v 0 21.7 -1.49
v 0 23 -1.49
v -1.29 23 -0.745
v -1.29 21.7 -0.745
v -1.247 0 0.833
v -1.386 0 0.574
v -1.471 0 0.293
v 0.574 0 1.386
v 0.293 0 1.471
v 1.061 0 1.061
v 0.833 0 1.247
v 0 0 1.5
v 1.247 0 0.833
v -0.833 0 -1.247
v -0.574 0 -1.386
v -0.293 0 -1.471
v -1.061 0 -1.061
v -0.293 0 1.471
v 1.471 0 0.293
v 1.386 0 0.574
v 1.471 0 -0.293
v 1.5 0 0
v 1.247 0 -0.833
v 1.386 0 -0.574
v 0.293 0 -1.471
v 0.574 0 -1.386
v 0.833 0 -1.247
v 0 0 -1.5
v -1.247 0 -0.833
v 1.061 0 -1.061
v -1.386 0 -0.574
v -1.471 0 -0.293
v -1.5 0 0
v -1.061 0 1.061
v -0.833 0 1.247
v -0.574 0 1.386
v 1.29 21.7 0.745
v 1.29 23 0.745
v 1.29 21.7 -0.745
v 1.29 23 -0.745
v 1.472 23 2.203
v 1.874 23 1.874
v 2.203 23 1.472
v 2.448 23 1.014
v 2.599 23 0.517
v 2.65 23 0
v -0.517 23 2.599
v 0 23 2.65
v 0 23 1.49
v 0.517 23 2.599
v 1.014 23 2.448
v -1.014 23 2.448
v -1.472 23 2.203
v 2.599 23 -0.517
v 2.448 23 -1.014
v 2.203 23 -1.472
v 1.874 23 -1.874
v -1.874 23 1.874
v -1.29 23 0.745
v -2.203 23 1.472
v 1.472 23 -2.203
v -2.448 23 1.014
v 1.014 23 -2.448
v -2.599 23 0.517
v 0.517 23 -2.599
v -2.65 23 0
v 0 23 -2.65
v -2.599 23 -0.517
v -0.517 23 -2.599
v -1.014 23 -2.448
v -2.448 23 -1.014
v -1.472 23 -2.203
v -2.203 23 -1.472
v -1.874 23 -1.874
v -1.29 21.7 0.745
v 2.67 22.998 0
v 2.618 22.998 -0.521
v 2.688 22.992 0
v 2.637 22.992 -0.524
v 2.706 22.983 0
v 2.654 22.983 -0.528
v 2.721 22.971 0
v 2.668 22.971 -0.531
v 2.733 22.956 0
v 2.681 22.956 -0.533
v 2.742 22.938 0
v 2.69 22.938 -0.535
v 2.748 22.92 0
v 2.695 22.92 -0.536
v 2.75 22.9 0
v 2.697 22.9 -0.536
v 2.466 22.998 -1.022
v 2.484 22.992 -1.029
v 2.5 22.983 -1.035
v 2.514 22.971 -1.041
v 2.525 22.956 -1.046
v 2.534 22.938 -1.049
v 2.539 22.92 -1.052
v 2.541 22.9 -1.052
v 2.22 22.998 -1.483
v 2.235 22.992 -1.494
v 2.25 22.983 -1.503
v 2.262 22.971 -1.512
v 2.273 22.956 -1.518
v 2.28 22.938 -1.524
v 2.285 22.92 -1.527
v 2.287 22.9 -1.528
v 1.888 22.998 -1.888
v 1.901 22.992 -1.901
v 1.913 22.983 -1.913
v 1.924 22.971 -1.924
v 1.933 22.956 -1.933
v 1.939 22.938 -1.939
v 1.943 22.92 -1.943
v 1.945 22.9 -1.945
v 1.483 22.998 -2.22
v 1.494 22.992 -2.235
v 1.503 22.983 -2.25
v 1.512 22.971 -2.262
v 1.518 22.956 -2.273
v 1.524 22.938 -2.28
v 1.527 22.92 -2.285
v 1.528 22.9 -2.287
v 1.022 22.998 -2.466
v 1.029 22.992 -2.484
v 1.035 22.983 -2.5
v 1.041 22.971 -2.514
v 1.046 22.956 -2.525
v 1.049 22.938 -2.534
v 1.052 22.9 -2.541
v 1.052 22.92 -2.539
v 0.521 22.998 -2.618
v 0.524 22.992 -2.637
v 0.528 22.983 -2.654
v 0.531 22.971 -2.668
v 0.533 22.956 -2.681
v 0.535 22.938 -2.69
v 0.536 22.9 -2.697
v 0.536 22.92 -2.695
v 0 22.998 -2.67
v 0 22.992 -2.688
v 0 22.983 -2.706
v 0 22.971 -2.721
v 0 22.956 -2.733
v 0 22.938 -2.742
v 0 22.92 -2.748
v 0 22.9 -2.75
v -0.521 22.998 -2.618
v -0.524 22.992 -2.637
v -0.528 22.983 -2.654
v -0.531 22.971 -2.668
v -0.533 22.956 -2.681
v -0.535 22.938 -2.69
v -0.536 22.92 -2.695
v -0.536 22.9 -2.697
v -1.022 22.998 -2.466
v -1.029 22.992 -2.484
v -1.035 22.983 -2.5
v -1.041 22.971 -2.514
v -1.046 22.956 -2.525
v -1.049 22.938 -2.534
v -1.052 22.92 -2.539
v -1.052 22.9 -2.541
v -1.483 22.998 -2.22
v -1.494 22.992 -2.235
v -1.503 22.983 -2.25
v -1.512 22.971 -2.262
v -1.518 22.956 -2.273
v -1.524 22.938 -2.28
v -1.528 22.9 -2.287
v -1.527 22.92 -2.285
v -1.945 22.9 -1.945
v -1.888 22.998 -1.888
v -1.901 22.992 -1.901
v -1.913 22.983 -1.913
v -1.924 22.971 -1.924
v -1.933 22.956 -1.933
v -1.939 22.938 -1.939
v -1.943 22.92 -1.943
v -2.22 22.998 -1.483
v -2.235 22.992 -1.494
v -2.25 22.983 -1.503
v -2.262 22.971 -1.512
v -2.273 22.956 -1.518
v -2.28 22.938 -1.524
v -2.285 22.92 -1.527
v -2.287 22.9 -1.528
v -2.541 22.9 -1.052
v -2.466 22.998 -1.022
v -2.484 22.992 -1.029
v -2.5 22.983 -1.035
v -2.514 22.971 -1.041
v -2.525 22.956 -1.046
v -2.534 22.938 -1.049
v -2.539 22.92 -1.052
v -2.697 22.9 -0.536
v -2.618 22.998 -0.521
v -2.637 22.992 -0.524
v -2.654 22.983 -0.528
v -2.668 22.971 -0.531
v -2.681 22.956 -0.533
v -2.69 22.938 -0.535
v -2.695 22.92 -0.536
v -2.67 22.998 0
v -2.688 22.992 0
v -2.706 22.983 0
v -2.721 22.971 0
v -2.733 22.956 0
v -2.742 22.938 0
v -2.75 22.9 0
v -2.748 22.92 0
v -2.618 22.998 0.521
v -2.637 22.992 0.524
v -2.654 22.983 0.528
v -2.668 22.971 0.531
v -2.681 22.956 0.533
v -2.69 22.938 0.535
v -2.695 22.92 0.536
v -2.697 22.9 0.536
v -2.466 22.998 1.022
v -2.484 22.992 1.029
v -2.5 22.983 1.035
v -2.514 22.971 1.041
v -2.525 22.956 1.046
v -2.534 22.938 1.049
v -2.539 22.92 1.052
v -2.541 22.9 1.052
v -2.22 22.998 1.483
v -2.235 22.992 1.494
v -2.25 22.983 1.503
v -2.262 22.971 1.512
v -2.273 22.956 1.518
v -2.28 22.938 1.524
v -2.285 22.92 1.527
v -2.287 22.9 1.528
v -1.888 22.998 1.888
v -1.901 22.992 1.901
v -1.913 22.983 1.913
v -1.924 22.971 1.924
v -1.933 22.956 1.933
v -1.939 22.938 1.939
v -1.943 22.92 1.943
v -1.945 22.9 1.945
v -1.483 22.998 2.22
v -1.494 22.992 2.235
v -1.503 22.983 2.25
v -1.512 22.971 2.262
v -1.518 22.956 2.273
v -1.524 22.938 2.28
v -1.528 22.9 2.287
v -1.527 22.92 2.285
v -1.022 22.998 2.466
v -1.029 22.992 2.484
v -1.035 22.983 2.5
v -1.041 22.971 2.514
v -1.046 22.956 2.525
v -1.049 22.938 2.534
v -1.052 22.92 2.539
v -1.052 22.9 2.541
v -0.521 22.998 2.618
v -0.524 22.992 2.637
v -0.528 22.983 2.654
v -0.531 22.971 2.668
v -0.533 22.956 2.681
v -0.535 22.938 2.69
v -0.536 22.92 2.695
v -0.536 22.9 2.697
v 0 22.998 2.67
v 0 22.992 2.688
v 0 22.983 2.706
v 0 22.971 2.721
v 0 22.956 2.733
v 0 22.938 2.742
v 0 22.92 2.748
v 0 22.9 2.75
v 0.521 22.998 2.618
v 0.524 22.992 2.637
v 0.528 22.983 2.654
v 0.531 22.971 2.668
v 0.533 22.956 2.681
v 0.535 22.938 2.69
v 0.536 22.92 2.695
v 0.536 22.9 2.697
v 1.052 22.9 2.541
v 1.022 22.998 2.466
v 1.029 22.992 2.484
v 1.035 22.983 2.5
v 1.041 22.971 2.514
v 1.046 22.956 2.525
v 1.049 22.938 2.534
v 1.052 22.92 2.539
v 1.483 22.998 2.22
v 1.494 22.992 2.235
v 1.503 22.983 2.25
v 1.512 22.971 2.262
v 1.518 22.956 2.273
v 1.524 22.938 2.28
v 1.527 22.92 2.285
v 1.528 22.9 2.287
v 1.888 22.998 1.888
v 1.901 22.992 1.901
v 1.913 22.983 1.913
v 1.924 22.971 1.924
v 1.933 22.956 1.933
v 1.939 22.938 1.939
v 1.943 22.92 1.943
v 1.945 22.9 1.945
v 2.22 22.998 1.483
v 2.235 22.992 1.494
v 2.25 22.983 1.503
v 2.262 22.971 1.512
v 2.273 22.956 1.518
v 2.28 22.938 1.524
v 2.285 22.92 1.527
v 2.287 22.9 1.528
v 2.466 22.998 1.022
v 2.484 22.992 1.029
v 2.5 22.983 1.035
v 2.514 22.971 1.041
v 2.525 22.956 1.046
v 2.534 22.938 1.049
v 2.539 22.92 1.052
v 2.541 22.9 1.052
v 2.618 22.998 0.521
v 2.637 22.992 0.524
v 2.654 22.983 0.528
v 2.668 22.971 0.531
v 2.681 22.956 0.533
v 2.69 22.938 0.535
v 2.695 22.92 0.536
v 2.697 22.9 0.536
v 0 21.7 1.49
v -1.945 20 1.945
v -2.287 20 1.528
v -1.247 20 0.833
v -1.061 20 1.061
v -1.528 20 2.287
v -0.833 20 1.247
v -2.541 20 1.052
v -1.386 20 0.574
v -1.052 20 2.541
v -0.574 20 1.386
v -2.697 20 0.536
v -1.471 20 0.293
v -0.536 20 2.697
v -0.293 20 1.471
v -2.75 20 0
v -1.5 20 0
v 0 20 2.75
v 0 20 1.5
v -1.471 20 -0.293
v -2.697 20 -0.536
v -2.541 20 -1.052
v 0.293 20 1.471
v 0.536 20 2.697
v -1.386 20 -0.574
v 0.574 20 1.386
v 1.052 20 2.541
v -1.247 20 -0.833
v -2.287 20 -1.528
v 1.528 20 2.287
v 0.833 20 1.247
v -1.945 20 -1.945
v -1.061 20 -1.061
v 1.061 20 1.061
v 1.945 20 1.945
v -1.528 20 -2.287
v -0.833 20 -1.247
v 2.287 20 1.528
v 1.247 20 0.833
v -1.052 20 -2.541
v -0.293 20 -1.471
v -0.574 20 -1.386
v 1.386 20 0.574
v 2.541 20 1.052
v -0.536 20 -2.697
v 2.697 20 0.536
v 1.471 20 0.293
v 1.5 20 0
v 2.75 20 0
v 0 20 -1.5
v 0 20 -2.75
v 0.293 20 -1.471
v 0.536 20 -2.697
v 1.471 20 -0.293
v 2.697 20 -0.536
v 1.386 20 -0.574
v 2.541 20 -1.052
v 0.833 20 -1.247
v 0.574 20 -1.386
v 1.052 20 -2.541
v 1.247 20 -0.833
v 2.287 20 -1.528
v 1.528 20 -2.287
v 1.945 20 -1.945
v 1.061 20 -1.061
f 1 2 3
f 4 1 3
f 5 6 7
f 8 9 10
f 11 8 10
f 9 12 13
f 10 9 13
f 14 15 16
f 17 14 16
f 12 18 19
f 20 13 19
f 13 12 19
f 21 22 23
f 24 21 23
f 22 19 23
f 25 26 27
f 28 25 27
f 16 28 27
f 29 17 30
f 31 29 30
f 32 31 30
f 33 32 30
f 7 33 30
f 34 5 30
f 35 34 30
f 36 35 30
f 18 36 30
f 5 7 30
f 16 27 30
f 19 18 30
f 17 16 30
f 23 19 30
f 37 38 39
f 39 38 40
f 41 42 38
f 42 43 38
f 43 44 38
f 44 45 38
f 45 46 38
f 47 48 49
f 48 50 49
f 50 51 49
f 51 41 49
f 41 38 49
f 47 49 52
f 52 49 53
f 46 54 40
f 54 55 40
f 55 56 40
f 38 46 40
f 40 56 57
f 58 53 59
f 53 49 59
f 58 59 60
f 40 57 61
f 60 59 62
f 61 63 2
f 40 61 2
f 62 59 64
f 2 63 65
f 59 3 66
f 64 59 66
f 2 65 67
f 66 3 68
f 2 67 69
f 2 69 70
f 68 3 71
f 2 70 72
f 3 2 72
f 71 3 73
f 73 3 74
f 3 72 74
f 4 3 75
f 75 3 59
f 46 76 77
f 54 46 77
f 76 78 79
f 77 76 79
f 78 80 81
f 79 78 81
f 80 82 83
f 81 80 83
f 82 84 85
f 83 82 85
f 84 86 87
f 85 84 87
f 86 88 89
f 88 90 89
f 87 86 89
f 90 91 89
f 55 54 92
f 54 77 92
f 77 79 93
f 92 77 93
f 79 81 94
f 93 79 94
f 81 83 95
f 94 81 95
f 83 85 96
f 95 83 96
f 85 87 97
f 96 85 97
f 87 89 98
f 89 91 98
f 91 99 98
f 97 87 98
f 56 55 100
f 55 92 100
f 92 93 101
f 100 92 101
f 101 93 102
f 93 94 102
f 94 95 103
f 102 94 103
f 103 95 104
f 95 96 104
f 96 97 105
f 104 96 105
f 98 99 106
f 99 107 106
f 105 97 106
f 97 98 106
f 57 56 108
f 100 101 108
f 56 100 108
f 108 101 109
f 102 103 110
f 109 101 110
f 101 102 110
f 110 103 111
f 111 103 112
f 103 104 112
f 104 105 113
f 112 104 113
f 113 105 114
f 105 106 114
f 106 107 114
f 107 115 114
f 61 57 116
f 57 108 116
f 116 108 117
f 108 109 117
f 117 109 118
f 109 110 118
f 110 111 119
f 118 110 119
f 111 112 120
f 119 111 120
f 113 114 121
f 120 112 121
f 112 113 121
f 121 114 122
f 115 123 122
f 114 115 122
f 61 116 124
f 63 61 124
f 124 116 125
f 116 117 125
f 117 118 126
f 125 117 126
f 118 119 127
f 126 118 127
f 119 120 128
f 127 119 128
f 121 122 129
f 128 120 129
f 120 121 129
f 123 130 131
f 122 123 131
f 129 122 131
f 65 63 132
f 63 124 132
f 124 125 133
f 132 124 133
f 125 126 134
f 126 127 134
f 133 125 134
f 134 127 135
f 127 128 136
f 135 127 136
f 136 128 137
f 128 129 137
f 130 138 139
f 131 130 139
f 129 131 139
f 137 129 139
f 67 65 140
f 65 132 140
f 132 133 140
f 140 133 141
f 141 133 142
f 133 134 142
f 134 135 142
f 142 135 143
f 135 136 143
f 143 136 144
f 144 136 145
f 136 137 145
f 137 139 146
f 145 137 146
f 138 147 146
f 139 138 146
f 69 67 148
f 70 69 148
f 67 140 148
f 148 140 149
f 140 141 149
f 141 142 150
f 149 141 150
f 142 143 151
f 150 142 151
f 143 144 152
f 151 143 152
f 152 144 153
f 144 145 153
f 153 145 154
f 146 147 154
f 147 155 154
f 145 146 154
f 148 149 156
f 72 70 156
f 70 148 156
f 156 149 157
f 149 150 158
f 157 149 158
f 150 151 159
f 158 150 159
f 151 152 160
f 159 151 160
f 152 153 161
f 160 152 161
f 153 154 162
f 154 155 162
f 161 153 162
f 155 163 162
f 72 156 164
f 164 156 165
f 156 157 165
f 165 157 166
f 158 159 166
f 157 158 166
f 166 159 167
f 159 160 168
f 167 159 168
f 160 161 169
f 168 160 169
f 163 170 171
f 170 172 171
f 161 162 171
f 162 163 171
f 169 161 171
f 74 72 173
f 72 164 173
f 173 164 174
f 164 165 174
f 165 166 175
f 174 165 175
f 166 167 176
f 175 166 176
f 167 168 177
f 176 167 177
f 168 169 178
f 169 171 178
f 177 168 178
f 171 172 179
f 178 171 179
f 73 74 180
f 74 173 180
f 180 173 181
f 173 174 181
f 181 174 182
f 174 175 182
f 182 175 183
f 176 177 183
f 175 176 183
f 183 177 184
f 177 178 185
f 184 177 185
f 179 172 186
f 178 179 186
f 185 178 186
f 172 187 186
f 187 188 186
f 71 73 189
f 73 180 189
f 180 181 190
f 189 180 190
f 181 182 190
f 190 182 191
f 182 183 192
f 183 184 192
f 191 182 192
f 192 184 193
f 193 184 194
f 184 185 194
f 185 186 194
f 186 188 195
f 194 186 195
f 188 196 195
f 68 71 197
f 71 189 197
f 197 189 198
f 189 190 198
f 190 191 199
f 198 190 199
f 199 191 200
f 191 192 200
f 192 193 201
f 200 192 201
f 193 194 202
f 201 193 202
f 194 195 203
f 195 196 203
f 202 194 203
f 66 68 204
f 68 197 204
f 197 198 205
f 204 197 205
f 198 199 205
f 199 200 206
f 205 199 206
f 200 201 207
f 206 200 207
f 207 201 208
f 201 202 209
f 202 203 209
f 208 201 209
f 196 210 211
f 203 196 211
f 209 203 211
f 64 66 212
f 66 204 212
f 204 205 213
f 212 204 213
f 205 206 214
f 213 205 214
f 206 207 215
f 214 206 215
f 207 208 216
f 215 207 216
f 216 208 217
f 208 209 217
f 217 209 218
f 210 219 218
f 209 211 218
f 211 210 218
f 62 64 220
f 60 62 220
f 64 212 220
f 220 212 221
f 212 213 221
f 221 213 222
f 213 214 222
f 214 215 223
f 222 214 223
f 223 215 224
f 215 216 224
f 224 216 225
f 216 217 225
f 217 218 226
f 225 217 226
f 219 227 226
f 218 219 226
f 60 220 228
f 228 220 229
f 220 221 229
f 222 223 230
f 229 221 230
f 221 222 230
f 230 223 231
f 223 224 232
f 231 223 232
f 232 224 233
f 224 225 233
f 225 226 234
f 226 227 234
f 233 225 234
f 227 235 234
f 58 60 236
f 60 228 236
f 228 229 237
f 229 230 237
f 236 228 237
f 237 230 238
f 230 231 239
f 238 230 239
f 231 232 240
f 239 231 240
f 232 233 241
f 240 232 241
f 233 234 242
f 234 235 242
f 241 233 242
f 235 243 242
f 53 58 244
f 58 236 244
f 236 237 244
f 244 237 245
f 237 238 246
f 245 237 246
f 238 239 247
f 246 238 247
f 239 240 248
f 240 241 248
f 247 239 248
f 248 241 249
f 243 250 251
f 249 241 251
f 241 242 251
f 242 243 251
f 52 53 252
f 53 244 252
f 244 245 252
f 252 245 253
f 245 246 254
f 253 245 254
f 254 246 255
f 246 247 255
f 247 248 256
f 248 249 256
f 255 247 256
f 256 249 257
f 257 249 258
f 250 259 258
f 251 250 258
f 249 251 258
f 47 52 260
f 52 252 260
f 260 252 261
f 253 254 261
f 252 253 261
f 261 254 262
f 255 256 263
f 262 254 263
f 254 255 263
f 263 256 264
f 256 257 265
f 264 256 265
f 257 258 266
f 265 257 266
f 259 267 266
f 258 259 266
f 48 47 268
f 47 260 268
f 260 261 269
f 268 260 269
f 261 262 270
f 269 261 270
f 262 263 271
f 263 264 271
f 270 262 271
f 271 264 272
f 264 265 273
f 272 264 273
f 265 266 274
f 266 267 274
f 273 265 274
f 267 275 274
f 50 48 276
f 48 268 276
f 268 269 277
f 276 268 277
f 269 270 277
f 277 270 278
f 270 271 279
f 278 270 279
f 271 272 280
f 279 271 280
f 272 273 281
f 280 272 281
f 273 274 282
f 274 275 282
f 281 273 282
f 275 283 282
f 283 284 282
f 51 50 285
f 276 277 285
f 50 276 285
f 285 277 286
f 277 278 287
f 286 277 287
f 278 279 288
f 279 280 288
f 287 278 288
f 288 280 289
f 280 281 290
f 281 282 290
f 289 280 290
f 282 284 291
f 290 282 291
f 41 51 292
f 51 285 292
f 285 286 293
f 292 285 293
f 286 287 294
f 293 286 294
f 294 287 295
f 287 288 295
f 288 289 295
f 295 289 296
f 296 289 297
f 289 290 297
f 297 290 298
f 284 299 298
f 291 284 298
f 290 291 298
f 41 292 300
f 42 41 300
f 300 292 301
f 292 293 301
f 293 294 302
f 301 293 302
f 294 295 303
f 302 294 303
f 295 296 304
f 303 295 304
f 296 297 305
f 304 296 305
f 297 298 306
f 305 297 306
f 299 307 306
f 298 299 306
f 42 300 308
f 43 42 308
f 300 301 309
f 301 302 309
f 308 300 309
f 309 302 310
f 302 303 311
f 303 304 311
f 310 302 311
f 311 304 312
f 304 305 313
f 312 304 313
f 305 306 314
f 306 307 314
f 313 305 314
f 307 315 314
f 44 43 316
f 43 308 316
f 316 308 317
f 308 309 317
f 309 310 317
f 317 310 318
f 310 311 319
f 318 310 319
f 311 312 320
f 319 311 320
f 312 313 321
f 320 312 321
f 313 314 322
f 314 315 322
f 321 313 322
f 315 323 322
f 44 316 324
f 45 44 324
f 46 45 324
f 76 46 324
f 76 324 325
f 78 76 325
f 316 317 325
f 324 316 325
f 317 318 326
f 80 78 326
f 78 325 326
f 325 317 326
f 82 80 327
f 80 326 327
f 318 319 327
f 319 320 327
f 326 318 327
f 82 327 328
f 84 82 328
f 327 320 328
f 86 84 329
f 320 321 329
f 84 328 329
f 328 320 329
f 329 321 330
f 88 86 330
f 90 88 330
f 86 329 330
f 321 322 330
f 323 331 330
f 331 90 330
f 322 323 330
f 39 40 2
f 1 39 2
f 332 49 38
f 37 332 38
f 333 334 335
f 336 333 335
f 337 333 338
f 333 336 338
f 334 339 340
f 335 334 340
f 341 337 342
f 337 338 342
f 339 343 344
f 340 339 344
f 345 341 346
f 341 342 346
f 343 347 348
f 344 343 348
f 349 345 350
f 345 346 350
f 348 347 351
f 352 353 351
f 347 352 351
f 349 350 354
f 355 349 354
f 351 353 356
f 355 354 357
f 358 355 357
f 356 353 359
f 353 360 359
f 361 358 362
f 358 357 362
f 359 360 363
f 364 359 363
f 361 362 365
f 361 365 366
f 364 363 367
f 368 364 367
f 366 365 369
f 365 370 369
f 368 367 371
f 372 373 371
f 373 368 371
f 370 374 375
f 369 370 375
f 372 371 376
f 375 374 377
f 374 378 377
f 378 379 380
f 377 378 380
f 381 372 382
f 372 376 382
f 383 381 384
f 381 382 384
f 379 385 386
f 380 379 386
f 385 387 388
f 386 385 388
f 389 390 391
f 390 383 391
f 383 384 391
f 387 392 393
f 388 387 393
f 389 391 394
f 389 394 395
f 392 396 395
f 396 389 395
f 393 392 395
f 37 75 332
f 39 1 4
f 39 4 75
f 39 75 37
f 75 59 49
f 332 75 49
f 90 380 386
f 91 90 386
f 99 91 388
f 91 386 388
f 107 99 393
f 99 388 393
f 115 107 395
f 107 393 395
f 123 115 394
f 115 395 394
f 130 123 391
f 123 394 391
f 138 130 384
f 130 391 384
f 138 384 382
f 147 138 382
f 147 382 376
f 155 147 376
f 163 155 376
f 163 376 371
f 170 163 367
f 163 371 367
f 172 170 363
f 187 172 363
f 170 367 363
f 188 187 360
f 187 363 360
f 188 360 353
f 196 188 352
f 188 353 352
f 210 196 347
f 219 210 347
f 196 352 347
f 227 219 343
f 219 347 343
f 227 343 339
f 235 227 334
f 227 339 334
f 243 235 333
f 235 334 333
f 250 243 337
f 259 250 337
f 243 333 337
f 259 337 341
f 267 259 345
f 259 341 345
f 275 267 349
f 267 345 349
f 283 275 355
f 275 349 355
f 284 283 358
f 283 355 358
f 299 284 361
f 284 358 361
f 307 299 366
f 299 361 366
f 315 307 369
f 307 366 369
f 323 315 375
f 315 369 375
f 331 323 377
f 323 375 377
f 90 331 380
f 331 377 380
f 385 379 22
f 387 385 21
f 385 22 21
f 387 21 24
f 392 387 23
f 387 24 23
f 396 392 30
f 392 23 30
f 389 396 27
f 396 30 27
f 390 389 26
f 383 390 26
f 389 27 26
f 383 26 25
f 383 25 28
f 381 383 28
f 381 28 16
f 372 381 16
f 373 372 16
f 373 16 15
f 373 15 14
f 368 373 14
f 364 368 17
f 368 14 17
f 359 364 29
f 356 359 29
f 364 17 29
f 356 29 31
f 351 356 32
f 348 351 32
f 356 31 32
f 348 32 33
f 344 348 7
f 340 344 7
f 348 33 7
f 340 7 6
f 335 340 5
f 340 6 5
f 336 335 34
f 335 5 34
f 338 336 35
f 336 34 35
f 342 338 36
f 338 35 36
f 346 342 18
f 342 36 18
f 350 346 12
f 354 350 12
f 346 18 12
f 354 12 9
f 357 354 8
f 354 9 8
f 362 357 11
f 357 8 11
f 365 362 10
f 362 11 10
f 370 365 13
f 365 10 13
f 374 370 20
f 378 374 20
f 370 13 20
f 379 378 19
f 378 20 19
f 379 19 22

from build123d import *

# Parameters (mm, degrees)
CUT_EXTRUDE1_DEPTH = 1.3
FILLET1_R          = 0.1


with BuildPart() as part:
    # Sketch1 → Revolve1 (revolve)
    with BuildSketch(Plane.XY):
        Polygon((0, 0), (0, 23), (2.75, 23), (2.75, 20), (1.5, 20), (1.5, 0), align=None)
    revolve(axis=Axis((0, 0, 0), (0, 1, 0)))

    # Sketch2 → Cut-Extrude1 (cut)
    with BuildSketch(Plane(origin=(0, 23, 0), x_dir=(1, 0, 0), z_dir=(0, 1, 0))):
        Polygon((0, 1.489563695), (-1.29, 0.744781847), (-1.29, -0.744781847), (0, -1.489563695), (1.29, -0.744781847), (1.29, 0.744781847), align=None)
    extrude(amount=-CUT_EXTRUDE1_DEPTH, mode=Mode.SUBTRACT)

    # Fillet1
    fillet1_edges = [part.edges().sort_by_distance(p)[0] for p in [
        (-2.75, 23, 0),
    ]]
    fillet(fillet1_edges, radius=FILLET1_R)


solid = part.part
